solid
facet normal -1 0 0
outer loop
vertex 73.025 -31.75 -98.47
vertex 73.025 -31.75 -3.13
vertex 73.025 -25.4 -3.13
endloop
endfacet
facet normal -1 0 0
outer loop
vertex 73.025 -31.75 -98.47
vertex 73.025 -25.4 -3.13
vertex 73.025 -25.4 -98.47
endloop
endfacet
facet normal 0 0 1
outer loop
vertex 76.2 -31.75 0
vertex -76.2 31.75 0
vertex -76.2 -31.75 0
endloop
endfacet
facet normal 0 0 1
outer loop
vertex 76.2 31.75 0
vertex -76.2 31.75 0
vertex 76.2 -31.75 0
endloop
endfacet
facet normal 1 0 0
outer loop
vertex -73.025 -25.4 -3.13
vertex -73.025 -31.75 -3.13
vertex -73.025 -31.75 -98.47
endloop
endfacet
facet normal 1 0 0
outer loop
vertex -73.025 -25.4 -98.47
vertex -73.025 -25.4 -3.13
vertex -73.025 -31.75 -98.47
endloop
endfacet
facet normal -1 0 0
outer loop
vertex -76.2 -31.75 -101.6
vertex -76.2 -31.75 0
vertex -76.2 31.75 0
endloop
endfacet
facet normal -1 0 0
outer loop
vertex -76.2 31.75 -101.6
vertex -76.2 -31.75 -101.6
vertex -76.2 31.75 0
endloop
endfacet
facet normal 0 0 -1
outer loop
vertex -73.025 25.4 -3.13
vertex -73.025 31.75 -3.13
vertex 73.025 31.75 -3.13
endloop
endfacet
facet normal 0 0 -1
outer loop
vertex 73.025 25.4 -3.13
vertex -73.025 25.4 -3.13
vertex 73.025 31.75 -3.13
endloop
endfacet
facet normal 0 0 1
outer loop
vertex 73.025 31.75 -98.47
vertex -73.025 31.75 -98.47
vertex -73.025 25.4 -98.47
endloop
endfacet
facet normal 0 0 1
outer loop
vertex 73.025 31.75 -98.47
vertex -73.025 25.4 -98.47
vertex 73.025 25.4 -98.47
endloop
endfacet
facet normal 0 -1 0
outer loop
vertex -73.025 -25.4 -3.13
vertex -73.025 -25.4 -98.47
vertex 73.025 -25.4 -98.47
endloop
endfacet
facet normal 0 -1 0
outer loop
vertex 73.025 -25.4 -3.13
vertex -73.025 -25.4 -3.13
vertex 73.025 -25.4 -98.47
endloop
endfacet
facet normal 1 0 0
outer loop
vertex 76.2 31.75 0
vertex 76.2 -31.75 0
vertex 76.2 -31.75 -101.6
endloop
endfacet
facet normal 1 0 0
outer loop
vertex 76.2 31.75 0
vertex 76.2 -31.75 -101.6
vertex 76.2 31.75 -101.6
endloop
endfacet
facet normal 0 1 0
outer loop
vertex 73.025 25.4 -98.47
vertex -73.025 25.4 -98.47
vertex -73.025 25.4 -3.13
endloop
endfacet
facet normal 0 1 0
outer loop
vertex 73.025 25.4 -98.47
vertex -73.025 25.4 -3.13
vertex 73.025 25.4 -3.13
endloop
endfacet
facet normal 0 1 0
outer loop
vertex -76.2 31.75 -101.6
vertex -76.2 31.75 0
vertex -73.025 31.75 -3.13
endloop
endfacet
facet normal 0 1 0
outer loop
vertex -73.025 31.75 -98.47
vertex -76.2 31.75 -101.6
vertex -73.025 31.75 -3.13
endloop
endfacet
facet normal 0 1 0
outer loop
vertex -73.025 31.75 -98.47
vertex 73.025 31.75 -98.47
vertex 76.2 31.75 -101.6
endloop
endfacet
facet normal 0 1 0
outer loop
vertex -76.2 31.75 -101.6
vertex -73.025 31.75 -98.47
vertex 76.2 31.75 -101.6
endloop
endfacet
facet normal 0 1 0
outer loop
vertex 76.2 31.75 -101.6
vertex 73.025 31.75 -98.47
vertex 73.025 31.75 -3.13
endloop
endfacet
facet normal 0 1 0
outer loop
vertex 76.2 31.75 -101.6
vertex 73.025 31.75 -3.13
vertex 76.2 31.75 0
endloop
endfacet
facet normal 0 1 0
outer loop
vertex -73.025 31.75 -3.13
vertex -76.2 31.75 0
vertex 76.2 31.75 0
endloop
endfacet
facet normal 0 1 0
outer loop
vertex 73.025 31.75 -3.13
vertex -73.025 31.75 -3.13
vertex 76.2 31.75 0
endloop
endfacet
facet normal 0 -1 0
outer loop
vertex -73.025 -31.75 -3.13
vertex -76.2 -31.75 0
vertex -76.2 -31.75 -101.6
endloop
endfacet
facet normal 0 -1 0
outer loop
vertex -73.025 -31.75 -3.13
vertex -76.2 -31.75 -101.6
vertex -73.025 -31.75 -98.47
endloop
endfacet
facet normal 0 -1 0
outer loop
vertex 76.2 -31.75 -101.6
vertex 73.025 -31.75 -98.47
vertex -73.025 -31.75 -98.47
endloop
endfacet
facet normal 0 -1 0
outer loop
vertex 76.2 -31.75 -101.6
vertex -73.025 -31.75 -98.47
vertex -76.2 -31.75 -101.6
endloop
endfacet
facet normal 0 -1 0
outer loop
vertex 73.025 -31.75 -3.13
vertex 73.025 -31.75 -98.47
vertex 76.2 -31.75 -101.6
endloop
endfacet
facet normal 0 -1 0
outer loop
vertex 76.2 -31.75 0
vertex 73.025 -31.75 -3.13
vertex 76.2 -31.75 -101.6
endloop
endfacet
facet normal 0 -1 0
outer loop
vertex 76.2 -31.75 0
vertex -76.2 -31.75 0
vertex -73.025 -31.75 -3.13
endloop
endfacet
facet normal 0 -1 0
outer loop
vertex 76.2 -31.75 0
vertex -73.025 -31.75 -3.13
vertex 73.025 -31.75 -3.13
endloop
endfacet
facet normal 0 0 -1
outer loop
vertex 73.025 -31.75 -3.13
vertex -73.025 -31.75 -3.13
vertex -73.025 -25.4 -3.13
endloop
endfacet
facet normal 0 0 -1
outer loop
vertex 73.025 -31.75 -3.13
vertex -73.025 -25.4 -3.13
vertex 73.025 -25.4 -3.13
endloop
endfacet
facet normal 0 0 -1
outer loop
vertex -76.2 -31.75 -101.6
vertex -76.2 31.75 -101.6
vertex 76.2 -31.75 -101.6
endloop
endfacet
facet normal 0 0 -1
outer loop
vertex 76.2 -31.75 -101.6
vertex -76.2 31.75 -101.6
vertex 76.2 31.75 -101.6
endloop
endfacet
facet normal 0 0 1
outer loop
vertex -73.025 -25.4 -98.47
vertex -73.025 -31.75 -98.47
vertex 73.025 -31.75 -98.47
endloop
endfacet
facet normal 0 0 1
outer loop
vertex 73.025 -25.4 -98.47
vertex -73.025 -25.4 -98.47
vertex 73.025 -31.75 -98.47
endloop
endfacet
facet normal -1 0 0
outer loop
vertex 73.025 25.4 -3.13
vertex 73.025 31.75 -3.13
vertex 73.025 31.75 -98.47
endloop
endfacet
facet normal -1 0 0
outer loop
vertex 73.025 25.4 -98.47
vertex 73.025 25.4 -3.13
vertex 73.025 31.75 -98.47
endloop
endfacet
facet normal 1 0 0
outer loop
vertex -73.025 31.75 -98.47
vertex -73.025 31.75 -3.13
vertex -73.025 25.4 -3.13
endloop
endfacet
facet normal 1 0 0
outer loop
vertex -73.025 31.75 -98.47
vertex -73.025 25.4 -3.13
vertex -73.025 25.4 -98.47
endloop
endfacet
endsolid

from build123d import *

# Parameters (mm, degrees)
SKETCH1_W           = 152.4
SKETCH1_H           = 63.5
BOSS_EXTRUDE1_DEPTH = 101.6
SKETCH3_W           = 146.05
SKETCH3_H           = 95.34
CUT_EXTRUDE1_DEPTH  = 6.35


with BuildPart() as part:
    # Sketch1 → Boss-Extrude1 (new body)
    with BuildSketch(Plane.XY):
        Rectangle(SKETCH1_W, SKETCH1_H)
    extrude(amount=-BOSS_EXTRUDE1_DEPTH)

    # Sketch3 → Cut-Extrude1 (cut)
    with BuildSketch(Plane(origin=(0, 31.75, 0), x_dir=(1, 0, 0), z_dir=(0, 1, 0))):
        with Locations((0, 50.8)):
            Rectangle(SKETCH3_W, SKETCH3_H)
    cut_extrude1 = extrude(amount=-CUT_EXTRUDE1_DEPTH, mode=Mode.SUBTRACT)

    # Mirror1: Cut-Extrude1 across plane
    add(cut_extrude1.mirror(Plane.ZX), mode=Mode.SUBTRACT)


solid = part.part
